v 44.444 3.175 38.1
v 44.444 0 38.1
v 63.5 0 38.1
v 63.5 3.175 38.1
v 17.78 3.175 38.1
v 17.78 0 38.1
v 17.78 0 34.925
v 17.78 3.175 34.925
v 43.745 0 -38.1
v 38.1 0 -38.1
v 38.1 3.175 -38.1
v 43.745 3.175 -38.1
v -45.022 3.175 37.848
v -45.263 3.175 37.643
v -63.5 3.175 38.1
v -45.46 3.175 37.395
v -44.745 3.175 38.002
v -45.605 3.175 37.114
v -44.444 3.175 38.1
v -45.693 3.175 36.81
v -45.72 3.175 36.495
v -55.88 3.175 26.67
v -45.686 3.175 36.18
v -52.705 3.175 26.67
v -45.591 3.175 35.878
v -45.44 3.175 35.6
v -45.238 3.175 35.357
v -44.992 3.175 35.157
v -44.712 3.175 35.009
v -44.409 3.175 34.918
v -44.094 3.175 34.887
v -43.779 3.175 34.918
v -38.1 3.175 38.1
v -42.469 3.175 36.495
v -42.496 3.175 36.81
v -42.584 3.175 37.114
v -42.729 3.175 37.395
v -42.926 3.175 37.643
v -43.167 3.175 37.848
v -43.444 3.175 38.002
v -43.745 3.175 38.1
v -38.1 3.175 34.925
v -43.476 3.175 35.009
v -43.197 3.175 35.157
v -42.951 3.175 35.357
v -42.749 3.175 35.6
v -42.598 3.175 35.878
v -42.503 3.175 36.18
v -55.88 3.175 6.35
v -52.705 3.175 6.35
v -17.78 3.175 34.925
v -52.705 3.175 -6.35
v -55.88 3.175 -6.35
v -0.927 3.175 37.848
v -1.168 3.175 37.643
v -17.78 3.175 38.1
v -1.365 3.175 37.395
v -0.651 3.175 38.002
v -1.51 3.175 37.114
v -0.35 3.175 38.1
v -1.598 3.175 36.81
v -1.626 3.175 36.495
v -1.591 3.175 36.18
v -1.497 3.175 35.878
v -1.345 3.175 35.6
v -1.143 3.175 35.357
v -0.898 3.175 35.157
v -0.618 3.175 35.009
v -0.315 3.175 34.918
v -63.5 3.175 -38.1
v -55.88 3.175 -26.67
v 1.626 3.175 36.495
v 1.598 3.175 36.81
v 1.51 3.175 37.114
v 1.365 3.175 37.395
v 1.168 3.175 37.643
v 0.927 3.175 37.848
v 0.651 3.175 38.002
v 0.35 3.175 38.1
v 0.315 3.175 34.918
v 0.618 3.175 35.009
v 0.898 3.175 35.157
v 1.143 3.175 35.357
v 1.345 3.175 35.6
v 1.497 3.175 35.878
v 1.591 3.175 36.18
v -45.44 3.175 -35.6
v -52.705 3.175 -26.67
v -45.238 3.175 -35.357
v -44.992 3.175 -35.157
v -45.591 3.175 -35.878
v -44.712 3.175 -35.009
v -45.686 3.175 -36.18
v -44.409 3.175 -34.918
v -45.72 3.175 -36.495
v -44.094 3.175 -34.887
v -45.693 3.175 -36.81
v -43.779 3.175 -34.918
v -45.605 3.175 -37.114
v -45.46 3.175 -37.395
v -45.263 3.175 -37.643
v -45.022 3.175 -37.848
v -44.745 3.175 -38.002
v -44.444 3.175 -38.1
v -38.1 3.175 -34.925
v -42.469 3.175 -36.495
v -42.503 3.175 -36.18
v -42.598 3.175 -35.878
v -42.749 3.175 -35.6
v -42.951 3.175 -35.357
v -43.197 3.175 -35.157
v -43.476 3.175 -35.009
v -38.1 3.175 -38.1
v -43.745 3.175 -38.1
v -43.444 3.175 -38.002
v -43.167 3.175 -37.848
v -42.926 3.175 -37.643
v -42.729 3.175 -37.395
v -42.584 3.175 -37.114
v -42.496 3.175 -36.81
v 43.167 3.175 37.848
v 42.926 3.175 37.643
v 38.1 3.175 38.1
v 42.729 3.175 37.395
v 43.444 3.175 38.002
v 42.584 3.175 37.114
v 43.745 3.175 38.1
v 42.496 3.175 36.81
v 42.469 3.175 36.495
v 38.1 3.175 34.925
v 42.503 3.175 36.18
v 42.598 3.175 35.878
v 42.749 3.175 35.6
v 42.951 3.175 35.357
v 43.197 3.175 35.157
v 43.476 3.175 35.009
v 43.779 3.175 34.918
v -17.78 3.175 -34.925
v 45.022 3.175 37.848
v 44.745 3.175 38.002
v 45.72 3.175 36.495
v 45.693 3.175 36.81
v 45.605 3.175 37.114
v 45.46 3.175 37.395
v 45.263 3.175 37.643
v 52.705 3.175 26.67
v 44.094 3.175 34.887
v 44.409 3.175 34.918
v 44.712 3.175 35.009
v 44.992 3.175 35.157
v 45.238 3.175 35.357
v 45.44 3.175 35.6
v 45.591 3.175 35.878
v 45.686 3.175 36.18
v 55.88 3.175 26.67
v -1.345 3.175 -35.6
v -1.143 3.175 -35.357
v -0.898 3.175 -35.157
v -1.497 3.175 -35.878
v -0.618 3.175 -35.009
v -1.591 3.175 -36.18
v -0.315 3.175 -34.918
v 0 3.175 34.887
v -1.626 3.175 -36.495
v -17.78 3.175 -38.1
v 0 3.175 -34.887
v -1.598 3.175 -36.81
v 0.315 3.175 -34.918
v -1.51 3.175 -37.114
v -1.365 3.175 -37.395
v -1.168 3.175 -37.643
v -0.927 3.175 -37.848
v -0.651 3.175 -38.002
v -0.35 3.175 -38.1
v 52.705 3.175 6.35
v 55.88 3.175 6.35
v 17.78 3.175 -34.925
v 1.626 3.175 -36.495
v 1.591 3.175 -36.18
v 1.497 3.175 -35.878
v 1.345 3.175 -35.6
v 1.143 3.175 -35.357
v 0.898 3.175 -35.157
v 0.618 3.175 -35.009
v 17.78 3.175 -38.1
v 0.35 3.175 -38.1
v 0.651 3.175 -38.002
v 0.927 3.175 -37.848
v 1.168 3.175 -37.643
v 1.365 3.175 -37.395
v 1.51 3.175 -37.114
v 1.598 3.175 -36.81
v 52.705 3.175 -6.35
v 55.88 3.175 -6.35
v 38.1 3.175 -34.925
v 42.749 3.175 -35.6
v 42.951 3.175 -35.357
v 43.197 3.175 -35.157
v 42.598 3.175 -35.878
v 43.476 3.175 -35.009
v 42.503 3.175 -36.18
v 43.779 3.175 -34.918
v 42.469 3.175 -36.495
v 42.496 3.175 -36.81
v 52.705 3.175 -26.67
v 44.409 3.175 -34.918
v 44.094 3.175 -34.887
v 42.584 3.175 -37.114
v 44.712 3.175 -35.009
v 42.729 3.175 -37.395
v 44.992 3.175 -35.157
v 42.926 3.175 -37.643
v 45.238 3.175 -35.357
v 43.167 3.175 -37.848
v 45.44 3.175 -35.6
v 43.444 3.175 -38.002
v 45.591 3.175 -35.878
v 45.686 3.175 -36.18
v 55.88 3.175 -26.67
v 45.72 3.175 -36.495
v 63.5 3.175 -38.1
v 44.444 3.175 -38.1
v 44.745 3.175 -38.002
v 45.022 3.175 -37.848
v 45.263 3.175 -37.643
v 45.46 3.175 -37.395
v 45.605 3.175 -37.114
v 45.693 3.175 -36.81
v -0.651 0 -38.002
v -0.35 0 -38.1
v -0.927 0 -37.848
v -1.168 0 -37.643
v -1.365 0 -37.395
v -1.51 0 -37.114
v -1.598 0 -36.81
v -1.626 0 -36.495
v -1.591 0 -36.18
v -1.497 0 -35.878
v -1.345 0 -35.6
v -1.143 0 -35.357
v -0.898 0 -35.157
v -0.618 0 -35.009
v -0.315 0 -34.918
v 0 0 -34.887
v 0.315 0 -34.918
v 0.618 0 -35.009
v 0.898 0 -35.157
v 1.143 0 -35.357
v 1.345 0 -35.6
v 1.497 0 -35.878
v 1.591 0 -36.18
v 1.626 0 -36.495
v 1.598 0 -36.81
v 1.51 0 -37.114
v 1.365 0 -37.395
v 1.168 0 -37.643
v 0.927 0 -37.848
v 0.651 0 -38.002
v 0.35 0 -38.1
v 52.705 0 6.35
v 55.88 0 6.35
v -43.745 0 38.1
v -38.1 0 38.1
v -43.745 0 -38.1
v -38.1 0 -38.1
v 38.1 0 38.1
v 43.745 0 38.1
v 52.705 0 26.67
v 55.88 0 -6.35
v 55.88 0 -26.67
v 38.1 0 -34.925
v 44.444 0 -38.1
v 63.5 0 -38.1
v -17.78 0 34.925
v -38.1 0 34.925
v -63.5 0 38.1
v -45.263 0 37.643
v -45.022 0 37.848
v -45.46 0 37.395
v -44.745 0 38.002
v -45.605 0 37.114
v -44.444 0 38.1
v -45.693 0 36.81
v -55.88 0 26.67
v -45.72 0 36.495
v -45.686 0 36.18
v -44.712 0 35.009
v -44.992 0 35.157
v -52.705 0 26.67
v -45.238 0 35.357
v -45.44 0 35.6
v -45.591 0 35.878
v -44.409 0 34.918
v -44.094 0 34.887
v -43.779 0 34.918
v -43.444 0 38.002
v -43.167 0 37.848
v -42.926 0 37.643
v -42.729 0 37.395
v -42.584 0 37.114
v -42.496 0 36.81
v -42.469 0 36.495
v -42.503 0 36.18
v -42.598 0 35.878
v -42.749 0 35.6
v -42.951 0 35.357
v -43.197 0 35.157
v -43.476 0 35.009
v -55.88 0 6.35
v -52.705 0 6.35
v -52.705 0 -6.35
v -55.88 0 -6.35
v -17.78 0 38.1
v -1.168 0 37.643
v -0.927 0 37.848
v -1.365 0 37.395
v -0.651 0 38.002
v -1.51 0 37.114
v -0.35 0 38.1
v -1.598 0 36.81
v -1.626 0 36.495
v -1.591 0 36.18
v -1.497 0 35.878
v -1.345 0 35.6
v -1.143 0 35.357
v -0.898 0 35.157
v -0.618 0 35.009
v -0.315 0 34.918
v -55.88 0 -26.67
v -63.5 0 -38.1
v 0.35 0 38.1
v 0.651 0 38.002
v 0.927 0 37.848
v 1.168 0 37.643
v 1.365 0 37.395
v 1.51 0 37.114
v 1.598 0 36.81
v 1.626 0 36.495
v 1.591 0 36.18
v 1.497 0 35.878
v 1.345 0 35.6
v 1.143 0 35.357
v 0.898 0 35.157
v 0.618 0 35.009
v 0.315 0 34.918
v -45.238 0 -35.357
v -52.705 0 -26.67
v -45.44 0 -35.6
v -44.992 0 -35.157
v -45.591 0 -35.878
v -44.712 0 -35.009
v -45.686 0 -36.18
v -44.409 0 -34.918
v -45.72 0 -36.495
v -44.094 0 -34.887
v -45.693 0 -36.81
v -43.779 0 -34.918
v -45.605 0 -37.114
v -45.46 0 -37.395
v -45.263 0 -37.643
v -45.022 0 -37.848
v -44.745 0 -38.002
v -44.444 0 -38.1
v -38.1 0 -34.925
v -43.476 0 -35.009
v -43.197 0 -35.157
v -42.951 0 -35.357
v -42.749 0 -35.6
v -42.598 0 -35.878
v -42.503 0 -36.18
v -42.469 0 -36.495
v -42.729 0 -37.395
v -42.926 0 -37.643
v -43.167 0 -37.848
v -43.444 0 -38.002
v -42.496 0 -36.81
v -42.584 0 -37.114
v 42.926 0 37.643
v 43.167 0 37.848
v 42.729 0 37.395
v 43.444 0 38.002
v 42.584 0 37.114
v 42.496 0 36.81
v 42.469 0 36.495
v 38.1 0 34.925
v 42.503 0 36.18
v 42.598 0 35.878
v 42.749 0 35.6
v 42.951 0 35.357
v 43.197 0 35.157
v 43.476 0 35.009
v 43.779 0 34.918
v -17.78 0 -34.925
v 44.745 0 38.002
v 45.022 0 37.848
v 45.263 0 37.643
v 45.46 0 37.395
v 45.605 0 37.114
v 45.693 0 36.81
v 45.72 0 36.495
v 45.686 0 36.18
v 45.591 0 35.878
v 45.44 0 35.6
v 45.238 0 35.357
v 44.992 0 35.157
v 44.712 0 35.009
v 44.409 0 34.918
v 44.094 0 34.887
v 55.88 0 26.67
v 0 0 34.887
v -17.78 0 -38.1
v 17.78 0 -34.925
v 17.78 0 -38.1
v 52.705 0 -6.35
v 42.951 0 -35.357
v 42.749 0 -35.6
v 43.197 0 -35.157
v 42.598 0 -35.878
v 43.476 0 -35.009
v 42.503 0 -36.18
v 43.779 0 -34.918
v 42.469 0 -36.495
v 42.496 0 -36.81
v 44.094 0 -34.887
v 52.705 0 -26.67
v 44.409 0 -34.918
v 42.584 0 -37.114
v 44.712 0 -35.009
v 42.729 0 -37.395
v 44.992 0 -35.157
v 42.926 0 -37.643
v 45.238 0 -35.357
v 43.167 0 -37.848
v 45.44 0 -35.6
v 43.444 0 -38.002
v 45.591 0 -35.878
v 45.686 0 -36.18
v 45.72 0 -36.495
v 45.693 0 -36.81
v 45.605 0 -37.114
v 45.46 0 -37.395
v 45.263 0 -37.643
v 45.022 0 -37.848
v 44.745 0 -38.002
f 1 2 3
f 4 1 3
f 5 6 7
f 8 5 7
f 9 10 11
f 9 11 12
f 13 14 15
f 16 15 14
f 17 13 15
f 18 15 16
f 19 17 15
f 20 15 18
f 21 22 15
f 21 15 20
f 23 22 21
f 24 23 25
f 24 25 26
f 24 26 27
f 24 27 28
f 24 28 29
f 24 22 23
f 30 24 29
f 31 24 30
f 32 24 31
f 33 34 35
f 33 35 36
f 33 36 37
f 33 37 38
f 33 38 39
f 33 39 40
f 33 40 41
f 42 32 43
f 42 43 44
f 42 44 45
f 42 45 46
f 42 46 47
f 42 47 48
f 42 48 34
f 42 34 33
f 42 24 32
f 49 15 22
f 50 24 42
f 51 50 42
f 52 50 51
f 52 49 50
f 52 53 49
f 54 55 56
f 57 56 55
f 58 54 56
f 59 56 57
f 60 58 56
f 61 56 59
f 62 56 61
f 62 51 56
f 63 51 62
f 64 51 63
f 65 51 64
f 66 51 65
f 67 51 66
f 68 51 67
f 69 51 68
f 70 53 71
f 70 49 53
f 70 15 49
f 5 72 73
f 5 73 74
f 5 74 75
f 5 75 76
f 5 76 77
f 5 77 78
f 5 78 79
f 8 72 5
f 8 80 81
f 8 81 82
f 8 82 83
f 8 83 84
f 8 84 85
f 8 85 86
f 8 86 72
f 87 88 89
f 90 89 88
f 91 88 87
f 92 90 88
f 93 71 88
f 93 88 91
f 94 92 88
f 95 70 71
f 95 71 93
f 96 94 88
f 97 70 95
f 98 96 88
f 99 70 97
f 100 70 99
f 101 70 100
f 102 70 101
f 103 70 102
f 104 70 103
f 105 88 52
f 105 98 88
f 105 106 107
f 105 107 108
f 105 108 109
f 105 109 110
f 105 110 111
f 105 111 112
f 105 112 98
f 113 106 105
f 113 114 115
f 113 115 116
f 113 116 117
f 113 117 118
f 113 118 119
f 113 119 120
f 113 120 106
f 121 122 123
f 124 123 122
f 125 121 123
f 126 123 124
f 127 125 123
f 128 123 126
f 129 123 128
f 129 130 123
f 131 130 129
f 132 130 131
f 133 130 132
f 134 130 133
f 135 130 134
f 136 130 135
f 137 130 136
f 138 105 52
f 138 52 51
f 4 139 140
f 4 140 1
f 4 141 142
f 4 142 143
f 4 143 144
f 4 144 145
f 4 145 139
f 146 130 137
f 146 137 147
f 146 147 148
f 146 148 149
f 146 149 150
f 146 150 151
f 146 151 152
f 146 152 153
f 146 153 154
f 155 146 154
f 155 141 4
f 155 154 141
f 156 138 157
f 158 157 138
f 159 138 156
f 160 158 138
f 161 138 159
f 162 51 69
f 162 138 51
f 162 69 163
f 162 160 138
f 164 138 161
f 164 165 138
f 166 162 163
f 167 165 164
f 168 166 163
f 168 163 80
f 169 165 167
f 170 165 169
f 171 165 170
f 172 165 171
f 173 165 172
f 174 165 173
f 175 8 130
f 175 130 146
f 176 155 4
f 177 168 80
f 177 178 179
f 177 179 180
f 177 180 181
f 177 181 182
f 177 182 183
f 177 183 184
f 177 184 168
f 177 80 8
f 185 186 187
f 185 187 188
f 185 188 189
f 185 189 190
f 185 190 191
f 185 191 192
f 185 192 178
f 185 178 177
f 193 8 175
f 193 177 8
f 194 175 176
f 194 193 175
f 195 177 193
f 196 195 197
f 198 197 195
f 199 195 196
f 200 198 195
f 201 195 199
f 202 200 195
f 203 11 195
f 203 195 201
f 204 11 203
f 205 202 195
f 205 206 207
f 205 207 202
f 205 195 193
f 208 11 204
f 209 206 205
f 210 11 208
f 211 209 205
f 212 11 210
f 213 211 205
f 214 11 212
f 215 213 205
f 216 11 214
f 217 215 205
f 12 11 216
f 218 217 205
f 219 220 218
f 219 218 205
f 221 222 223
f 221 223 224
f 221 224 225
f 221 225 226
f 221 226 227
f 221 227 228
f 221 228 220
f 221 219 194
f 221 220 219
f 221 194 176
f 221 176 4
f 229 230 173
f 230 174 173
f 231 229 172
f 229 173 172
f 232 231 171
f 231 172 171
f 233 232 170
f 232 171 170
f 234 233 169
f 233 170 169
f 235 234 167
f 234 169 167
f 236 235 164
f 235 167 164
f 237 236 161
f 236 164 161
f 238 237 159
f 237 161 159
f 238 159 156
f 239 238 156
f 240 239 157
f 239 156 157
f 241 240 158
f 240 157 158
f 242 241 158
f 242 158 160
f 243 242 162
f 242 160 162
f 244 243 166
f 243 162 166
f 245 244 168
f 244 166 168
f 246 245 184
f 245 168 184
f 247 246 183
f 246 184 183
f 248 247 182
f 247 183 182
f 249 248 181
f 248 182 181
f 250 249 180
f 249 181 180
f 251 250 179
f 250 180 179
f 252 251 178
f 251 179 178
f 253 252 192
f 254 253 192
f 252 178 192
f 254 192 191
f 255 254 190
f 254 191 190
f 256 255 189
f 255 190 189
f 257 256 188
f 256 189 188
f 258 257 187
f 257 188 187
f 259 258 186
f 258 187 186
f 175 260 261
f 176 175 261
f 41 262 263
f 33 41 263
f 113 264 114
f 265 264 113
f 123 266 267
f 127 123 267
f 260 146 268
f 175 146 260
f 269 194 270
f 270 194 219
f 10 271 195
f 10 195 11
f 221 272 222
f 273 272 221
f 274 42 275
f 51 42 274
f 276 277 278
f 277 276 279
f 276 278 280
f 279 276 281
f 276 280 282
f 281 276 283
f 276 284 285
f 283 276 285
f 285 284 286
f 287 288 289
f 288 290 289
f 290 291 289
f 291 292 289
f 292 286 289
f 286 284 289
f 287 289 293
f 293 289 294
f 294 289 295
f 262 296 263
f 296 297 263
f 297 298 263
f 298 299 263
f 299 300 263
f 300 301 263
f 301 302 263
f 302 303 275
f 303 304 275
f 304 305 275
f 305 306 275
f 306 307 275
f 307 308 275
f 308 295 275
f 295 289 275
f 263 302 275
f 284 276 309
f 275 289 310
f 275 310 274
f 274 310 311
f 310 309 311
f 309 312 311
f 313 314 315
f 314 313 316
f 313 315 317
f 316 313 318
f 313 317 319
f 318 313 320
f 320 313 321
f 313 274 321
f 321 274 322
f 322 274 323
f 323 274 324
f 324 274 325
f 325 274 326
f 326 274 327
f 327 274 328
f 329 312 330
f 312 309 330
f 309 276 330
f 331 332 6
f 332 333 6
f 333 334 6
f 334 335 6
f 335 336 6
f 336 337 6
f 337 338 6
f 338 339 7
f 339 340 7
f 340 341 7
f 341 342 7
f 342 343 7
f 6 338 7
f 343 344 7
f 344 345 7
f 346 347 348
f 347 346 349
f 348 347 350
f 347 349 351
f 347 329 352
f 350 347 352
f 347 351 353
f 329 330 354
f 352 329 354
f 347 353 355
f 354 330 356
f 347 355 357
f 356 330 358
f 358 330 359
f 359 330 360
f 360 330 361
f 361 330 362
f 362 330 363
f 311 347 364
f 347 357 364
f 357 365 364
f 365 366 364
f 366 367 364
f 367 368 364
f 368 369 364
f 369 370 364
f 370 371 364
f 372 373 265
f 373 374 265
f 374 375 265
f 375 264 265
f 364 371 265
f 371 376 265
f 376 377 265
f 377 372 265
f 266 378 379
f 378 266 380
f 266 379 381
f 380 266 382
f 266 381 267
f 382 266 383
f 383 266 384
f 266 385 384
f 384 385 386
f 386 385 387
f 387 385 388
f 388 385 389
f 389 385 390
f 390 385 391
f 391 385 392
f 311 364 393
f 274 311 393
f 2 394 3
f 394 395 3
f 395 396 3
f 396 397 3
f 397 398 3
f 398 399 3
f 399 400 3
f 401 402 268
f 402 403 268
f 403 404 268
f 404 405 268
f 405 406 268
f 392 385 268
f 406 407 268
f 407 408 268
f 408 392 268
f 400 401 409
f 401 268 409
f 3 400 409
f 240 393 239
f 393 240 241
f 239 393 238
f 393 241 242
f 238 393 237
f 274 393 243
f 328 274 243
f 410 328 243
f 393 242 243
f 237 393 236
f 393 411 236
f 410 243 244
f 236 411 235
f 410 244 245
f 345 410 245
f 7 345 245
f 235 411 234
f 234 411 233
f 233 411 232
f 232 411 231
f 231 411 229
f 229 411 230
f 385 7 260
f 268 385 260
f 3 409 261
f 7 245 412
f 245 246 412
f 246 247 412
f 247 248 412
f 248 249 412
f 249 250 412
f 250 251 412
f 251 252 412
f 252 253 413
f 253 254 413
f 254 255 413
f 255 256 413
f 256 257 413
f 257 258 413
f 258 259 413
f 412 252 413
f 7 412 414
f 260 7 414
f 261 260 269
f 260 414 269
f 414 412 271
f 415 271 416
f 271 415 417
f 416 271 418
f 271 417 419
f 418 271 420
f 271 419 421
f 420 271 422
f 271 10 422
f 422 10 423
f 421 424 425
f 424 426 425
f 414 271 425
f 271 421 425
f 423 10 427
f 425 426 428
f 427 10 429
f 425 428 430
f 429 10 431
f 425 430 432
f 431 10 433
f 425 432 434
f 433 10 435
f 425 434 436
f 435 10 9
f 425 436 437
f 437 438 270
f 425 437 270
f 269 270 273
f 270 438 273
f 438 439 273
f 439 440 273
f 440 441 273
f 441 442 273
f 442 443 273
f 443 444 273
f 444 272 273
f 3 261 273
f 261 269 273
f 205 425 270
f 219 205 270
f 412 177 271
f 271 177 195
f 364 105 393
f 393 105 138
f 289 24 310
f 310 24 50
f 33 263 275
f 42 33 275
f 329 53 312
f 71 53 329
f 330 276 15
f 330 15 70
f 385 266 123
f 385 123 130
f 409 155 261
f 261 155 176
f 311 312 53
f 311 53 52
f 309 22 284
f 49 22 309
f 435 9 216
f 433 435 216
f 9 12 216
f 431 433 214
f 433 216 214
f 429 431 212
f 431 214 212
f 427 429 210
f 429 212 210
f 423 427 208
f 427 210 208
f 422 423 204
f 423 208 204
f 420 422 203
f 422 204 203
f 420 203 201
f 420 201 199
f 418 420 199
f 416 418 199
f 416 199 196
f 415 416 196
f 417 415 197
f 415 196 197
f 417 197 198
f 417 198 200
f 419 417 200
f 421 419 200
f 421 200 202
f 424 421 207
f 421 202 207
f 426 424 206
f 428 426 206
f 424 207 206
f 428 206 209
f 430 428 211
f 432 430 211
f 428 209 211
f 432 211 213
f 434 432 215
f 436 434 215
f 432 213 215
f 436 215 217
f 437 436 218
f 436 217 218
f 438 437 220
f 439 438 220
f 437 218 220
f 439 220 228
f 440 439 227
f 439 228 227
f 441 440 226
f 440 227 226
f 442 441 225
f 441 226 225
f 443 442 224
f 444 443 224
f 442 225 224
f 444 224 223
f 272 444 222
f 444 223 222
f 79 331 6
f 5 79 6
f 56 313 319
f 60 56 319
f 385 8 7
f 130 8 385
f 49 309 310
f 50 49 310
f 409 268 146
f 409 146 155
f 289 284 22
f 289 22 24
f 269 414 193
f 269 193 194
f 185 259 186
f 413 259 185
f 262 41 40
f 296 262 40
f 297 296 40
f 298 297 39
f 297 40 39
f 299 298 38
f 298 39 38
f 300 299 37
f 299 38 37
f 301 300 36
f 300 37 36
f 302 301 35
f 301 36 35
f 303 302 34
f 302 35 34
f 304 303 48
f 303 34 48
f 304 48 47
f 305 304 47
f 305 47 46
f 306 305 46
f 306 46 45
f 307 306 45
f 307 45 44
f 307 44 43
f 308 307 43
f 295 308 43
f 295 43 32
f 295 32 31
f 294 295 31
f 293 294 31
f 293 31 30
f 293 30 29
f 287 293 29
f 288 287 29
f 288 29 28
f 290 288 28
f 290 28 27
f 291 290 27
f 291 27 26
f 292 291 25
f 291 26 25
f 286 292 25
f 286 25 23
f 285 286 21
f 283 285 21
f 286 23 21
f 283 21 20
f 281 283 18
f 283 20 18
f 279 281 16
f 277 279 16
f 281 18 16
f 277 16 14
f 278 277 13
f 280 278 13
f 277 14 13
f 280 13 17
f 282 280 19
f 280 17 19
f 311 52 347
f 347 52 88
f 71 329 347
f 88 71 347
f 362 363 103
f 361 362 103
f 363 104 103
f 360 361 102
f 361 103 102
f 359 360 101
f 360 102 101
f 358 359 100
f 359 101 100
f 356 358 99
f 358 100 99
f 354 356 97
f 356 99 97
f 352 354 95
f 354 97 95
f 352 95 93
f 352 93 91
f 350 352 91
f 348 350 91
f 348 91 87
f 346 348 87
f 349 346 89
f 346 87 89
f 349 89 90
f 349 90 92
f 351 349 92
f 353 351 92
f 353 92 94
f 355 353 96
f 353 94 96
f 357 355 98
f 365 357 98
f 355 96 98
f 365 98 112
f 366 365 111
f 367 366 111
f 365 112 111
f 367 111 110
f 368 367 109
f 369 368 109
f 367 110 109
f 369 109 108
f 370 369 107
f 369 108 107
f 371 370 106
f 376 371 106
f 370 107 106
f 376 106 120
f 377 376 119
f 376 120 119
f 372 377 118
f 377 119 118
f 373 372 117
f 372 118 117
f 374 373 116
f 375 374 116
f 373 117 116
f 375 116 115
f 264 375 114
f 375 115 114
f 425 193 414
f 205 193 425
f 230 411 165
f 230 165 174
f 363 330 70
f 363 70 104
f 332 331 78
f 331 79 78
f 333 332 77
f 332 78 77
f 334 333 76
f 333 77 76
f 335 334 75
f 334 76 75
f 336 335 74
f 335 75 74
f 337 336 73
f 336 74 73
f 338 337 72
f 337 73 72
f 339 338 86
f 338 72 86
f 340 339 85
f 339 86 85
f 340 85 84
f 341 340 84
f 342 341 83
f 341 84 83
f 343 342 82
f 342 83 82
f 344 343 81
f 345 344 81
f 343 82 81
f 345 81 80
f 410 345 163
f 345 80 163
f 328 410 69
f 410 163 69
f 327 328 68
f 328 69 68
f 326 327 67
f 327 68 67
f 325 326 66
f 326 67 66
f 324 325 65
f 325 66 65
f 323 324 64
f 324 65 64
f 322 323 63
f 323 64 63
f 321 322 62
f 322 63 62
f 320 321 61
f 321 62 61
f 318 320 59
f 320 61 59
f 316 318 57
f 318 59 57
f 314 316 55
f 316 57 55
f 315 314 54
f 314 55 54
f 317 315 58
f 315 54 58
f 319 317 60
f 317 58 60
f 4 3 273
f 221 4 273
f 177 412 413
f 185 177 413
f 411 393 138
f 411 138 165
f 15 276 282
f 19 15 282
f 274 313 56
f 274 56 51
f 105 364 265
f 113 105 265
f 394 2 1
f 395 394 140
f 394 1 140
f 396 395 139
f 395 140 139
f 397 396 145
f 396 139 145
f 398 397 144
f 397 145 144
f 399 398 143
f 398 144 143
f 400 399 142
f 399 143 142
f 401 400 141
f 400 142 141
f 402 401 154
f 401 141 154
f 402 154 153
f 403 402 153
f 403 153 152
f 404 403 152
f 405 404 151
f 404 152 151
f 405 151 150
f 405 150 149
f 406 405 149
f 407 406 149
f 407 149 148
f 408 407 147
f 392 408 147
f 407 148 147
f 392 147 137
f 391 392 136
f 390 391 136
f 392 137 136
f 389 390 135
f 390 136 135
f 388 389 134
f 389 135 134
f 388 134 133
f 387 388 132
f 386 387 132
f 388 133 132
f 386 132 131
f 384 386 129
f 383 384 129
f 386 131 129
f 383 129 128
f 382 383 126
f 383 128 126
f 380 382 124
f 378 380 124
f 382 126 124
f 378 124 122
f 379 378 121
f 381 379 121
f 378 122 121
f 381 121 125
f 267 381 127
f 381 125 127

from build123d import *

# Parameters (mm, degrees)
SKETCH1_W           = 127
SKETCH1_H           = 76.2
BOSS_EXTRUDE1_DEPTH = 3.175
SKETCH2_W           = 3.175
SKETCH2_H           = 20.32
CUT_EXTRUDE1_DEPTH  = 3.175
SKETCH3_W           = 20.32
SKETCH3_H           = 3.175
CUT_EXTRUDE2_DEPTH  = 3.175
SKETCH4_R           = 1.6256
CUT_EXTRUDE3_DEPTH  = 3.175


with BuildPart() as part:
    # Sketch1 → Boss-Extrude1 (new body)
    with BuildSketch(Plane(origin=(0, 0, 0), x_dir=(1, 0, 0), z_dir=(0, 1, 0))):
        Rectangle(SKETCH1_W, SKETCH1_H)
    extrude(amount=BOSS_EXTRUDE1_DEPTH)

    # Sketch2 → Cut-Extrude1 (cut)
    with BuildSketch(Plane(origin=(0, 3.175, 0), x_dir=(1, 0, 0), z_dir=(0, 1, 0))):
        with Locations((-54.2925, 16.51)):
            Rectangle(SKETCH2_W, SKETCH2_H)
        with Locations((-54.2925, -16.51)):
            Rectangle(SKETCH2_W, SKETCH2_H)
        with Locations((54.2925, -16.51)):
            Rectangle(SKETCH2_W, SKETCH2_H)
        with Locations((54.2925, 16.51)):
            Rectangle(SKETCH2_W, SKETCH2_H)
    extrude(amount=-CUT_EXTRUDE1_DEPTH, mode=Mode.SUBTRACT)

    # Sketch3 → Cut-Extrude2 (cut)
    with BuildSketch(Plane(origin=(0, 3.175, 0), x_dir=(1, 0, 0), z_dir=(0, 1, 0))):
        with Locations((-27.94, 36.5125)):
            Rectangle(SKETCH3_W, SKETCH3_H)
        with Locations((27.94, 36.5125)):
            Rectangle(SKETCH3_W, SKETCH3_H)
        with Locations((27.94, -36.5125)):
            Rectangle(SKETCH3_W, SKETCH3_H)
        with Locations((-27.94, -36.5125)):
            Rectangle(SKETCH3_W, SKETCH3_H)
    extrude(amount=-CUT_EXTRUDE2_DEPTH, mode=Mode.SUBTRACT)

    # Sketch4 → Cut-Extrude3 (cut)
    with BuildSketch(Plane(origin=(0, 3.175, 0), x_dir=(1, 0, 0), z_dir=(0, 1, 0))):
        with Locations((-44.0944, 36.5125)):
            Circle(SKETCH4_R)
        with Locations((0, 36.5125)):
            Circle(SKETCH4_R)
        with Locations((44.0944, 36.5125)):
            Circle(SKETCH4_R)
        with Locations((44.0944, -36.5125)):
            Circle(SKETCH4_R)
        with Locations((0, -36.5125)):
            Circle(SKETCH4_R)
        with Locations((-44.0944, -36.5125)):
            Circle(SKETCH4_R)
    extrude(amount=-CUT_EXTRUDE3_DEPTH, mode=Mode.SUBTRACT)


solid = part.part
